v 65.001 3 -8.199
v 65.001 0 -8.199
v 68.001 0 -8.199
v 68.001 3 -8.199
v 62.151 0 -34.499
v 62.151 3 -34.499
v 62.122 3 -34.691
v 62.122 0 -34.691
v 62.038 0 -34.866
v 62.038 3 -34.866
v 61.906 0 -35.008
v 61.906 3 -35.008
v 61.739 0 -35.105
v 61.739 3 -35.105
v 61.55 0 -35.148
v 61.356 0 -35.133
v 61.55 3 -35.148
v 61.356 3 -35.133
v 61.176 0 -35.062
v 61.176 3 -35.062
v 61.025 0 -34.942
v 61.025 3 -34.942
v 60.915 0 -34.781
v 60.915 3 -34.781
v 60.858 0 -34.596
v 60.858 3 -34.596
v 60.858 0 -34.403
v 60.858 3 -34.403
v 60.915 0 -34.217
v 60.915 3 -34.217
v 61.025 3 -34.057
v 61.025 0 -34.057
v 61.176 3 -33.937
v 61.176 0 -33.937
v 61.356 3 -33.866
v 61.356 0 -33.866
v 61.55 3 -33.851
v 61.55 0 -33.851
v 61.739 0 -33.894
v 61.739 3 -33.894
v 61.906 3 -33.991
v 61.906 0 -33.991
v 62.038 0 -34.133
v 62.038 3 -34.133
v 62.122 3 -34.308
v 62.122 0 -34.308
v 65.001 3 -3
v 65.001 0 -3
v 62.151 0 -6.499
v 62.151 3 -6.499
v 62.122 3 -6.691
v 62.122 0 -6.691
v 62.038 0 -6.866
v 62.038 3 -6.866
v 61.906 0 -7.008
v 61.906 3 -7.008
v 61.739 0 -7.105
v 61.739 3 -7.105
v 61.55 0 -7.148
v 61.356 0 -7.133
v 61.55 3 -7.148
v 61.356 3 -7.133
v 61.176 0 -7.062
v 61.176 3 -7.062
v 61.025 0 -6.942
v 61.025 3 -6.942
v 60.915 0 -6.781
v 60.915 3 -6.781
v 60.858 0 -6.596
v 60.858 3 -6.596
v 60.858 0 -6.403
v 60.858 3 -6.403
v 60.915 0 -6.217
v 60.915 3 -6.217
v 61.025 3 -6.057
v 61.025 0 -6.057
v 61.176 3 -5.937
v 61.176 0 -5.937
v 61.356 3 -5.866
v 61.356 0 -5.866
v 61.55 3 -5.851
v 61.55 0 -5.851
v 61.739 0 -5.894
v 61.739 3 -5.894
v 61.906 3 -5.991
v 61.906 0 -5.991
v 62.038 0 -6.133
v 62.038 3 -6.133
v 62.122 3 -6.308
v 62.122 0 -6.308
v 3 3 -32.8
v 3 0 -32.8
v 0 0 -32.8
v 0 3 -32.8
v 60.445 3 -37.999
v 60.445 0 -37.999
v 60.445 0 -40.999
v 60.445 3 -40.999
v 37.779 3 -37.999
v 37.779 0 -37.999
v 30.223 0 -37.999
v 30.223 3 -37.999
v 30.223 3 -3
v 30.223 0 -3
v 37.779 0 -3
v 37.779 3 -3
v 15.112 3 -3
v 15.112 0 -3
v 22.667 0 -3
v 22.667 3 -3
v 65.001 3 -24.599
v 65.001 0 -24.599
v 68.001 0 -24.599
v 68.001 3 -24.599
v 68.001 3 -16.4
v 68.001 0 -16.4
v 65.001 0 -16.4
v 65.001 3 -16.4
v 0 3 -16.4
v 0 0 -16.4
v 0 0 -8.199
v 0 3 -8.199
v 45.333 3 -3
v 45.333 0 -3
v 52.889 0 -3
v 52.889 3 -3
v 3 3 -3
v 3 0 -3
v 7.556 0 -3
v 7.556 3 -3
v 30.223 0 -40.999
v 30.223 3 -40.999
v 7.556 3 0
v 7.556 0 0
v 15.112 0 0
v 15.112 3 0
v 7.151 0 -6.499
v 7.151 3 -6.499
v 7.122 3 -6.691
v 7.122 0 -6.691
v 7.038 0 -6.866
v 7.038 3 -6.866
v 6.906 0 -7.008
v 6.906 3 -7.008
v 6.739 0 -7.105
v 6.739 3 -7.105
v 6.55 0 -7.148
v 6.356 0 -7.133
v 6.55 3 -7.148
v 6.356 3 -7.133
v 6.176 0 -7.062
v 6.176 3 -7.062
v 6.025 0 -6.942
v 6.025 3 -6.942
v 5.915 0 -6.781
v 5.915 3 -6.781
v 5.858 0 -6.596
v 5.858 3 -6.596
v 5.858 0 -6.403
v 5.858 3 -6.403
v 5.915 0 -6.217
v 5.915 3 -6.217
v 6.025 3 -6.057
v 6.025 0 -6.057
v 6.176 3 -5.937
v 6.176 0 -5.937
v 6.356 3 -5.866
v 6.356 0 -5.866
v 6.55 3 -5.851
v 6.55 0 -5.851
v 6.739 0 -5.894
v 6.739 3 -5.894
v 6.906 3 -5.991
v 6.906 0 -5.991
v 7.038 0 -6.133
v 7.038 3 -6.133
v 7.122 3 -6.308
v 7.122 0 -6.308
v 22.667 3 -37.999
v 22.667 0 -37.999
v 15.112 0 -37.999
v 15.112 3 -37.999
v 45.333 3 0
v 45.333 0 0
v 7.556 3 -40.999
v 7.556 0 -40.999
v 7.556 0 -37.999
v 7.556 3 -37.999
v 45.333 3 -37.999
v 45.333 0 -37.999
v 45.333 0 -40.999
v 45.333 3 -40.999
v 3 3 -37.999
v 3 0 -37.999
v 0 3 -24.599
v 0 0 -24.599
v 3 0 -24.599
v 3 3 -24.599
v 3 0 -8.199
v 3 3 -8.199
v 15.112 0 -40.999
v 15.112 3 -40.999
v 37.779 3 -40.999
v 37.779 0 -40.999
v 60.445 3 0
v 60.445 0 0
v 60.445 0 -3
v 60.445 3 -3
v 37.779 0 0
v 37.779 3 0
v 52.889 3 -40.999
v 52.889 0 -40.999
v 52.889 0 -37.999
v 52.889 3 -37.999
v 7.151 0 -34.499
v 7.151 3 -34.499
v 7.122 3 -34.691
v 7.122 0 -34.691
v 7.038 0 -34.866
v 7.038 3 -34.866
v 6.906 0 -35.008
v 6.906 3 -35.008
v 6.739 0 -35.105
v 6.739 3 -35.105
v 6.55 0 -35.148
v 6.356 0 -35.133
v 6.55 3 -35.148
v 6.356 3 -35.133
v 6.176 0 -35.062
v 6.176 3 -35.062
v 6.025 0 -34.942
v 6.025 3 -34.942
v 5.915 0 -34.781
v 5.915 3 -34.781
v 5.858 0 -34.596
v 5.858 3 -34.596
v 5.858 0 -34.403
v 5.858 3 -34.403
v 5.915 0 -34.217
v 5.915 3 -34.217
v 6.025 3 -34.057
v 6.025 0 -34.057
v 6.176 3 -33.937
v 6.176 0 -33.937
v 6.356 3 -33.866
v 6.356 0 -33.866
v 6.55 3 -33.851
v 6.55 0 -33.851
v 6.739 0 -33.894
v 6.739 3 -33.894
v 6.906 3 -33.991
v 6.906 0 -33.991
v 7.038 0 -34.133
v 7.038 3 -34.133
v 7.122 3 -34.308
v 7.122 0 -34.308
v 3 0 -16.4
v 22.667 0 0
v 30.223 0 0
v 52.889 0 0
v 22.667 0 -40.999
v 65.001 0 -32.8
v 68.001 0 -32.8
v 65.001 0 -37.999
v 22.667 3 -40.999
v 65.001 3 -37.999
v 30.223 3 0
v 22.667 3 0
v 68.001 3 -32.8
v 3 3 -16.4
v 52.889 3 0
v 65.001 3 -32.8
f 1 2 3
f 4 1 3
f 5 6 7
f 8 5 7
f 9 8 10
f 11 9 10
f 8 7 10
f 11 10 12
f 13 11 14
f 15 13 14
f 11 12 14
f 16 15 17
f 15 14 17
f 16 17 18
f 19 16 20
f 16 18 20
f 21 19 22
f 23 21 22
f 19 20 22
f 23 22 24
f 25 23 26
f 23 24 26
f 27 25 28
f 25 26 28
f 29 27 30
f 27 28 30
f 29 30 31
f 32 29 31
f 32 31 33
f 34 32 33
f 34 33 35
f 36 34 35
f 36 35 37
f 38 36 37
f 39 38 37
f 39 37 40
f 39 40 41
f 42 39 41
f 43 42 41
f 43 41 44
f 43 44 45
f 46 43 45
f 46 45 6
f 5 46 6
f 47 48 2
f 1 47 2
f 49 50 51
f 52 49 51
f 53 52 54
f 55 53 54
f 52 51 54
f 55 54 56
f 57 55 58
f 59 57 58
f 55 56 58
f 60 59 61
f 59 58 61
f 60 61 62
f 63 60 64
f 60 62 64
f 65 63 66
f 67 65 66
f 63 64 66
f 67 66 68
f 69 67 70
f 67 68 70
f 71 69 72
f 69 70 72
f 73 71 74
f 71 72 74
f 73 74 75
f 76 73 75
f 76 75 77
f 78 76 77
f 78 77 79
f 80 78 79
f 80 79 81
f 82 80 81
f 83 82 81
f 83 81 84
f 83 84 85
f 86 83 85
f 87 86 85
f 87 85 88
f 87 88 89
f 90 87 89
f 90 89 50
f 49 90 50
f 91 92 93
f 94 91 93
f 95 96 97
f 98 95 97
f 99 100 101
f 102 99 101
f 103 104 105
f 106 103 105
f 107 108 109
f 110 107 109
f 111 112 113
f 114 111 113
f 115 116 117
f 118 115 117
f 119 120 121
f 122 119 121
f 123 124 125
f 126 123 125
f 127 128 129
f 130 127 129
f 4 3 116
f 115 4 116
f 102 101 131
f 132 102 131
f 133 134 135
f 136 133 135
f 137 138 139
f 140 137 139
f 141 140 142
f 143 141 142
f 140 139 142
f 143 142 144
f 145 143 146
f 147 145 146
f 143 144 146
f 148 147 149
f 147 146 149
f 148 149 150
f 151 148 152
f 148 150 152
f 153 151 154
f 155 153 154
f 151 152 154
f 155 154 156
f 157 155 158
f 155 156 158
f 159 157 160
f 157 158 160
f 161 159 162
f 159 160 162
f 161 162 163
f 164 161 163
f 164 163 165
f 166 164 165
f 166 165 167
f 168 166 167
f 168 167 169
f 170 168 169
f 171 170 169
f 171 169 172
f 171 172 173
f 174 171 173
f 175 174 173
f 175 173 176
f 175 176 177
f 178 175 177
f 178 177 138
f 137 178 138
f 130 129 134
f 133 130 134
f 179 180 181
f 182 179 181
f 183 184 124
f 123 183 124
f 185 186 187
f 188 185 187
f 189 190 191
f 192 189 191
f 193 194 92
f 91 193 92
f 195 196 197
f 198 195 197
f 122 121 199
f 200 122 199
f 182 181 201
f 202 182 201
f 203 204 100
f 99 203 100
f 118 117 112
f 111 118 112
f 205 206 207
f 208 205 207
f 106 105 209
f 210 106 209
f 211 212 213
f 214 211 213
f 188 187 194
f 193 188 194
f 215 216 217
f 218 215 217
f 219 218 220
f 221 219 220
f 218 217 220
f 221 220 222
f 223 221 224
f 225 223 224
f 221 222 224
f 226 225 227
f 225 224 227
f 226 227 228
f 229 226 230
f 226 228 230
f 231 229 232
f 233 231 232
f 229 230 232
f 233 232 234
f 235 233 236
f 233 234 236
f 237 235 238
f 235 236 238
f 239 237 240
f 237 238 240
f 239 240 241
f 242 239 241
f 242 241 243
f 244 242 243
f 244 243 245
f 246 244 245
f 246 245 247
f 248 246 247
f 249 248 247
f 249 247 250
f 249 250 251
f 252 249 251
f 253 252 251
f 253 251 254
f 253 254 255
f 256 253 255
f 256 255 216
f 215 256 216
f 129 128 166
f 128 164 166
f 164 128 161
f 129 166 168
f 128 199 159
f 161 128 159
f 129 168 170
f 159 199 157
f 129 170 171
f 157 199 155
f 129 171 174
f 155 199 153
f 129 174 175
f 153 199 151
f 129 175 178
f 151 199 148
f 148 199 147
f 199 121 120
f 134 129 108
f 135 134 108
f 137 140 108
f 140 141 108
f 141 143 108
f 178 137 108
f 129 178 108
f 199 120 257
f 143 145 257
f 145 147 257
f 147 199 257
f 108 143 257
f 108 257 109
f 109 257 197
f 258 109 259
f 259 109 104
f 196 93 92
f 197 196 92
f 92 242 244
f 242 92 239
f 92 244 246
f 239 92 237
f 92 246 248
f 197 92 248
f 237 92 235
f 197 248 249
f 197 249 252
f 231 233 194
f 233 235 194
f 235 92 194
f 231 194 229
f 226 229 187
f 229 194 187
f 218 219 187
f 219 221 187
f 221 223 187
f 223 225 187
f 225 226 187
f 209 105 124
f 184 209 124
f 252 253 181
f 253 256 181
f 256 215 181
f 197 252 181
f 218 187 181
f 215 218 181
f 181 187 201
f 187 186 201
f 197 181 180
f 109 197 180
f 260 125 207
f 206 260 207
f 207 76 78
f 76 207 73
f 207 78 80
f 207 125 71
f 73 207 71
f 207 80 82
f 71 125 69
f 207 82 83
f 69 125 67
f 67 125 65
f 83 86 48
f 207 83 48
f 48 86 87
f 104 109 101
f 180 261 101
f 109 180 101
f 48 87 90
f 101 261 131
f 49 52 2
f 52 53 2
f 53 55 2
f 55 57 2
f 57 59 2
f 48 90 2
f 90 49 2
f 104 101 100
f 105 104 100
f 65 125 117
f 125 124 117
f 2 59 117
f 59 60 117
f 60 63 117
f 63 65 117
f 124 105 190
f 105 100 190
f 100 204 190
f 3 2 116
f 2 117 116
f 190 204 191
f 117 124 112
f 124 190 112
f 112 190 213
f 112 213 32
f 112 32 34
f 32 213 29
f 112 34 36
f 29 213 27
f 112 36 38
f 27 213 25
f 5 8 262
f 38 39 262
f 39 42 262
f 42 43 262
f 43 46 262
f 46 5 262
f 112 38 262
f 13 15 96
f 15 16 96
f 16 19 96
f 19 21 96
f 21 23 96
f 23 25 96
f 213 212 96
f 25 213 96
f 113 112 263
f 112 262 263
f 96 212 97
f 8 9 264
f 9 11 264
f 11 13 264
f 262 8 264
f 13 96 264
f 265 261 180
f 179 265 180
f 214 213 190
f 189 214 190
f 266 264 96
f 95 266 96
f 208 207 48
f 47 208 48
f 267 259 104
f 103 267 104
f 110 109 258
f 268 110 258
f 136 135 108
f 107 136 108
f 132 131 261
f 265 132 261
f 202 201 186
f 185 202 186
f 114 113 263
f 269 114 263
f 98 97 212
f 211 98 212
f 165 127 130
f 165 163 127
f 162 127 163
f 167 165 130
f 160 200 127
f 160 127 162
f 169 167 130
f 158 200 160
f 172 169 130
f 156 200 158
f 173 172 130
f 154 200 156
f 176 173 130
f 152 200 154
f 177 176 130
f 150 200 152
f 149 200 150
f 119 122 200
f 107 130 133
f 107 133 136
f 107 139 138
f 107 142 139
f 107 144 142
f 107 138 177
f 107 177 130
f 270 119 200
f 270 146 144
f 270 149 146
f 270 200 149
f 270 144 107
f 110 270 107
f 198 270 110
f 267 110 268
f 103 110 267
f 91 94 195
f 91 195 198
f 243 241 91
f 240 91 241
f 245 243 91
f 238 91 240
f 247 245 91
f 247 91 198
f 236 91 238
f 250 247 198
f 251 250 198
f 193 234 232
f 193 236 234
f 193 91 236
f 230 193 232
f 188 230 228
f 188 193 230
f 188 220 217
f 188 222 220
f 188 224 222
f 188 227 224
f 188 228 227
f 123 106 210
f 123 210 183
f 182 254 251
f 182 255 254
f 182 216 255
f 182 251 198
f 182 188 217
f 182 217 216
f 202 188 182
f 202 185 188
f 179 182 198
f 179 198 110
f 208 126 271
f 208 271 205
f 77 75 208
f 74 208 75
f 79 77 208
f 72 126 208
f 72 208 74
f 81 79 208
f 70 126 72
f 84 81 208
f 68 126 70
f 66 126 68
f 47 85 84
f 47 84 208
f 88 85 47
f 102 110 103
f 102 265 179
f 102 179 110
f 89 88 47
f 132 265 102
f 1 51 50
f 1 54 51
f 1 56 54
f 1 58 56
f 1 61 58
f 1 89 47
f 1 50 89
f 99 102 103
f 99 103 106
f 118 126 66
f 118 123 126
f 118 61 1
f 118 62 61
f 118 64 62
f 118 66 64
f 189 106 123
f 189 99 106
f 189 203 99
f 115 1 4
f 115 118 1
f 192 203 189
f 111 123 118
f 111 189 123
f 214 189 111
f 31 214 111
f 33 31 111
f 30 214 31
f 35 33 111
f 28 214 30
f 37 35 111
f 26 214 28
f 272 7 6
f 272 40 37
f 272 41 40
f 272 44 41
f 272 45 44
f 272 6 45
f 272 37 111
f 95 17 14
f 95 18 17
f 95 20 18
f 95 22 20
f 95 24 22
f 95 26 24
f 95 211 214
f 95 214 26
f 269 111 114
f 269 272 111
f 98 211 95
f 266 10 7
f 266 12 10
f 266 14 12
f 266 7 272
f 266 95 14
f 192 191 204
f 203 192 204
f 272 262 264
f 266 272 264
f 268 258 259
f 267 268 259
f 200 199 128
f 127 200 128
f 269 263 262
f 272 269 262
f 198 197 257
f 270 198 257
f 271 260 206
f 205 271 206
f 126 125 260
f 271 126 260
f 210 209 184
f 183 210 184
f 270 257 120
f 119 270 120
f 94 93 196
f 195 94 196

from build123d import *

# Parameters (mm, degrees)
AUFSATZ_LINEAR_AUSTRAGEN1_DEPTH = 3
SCHNITT_LINEAR_AUSTRAGEN1_REACH = 5
SKIZZE2_R                       = 0.65


with BuildPart() as part:
    # Skizze1 → Aufsatz-Linear austragen1 (new body)
    with BuildSketch(Plane(origin=(0, 0, 0), x_dir=(1, 0, 0), z_dir=(0, 1, 0))):
        Polygon((2.999994, 37.999416), (2.999994, 32.800036), (0, 32.800036), (0, 24.599138), (2.999994, 24.599138), (2.999994, 16.399764), (0, 16.399764), (0, 8.19912), (2.999994, 8.19912), (2.999994, 2.999994), (7.555738, 2.999994), (7.555738, 0), (15.11173, 0), (15.11173, 2.999994), (22.667468, 2.999994), (22.667468, 0), (30.223206, 0), (30.223206, 2.999994), (37.778944, 2.999994), (37.778944, 0), (45.333412, 0), (45.333412, 2.999994), (52.88915, 2.999994), (52.88915, 0), (60.444888, 0), (60.444888, 2.999994), (65.000632, 2.999994), (65.000632, 8.19912), (68.00088, 8.19912), (68.00088, 16.399764), (65.000632, 16.399764), (65.000632, 24.599138), (68.00088, 24.599138), (68.00088, 32.800036), (65.000632, 32.800036), (65.000632, 37.999416), (60.444888, 37.999416), (60.444888, 40.99941), (52.88915, 40.99941), (52.88915, 37.999416), (45.333412, 37.999416), (45.333412, 40.99941), (37.778944, 40.99941), (37.778944, 37.999416), (30.223206, 37.999416), (30.223206, 40.99941), (22.667468, 40.99941), (22.667468, 37.999416), (15.11173, 37.999416), (15.11173, 40.99941), (7.555738, 40.99941), (7.555738, 37.999416), align=None)
    extrude(amount=AUFSATZ_LINEAR_AUSTRAGEN1_DEPTH)

    # Skizze2 → Schnitt-Linear austragen1 (cut, up to next)
    with BuildSketch(Plane(origin=(0, 3, 0), x_dir=(1, 0, 0), z_dir=(0, 1, 0)), mode=Mode.PRIVATE) as schnitt_linear_austragen1_sk1:
        with Locations((6.501075, 34.499451)):
            Circle(SKIZZE2_R)
    schnitt_linear_austragen1_tool1 = extrude(schnitt_linear_austragen1_sk1.sketch, amount=-SCHNITT_LINEAR_AUSTRAGEN1_REACH, mode=Mode.PRIVATE) & part.part
    add(schnitt_linear_austragen1_tool1.solids().sort_by_distance((6.501075, 3, -34.499451))[0], mode=Mode.SUBTRACT)
    # Skizze2 → Schnitt-Linear austragen1 (cut, up to next)
    with BuildSketch(Plane(origin=(0, 3, 0), x_dir=(1, 0, 0), z_dir=(0, 1, 0)), mode=Mode.PRIVATE) as schnitt_linear_austragen1_sk2:
        with Locations((61.501075, 34.499451)):
            Circle(SKIZZE2_R)
    schnitt_linear_austragen1_tool2 = extrude(schnitt_linear_austragen1_sk2.sketch, amount=-SCHNITT_LINEAR_AUSTRAGEN1_REACH, mode=Mode.PRIVATE) & part.part
    add(schnitt_linear_austragen1_tool2.solids().sort_by_distance((61.501075, 3, -34.499451))[0], mode=Mode.SUBTRACT)
    # Skizze2 → Schnitt-Linear austragen1 (cut, up to next)
    with BuildSketch(Plane(origin=(0, 3, 0), x_dir=(1, 0, 0), z_dir=(0, 1, 0)), mode=Mode.PRIVATE) as schnitt_linear_austragen1_sk3:
        with Locations((61.501075, 6.499451)):
            Circle(SKIZZE2_R)
    schnitt_linear_austragen1_tool3 = extrude(schnitt_linear_austragen1_sk3.sketch, amount=-SCHNITT_LINEAR_AUSTRAGEN1_REACH, mode=Mode.PRIVATE) & part.part
    add(schnitt_linear_austragen1_tool3.solids().sort_by_distance((61.501075, 3, -6.499451))[0], mode=Mode.SUBTRACT)
    # Skizze2 → Schnitt-Linear austragen1 (cut, up to next)
    with BuildSketch(Plane(origin=(0, 3, 0), x_dir=(1, 0, 0), z_dir=(0, 1, 0)), mode=Mode.PRIVATE) as schnitt_linear_austragen1_sk4:
        with Locations((6.501075, 6.499451)):
            Circle(SKIZZE2_R)
    schnitt_linear_austragen1_tool4 = extrude(schnitt_linear_austragen1_sk4.sketch, amount=-SCHNITT_LINEAR_AUSTRAGEN1_REACH, mode=Mode.PRIVATE) & part.part
    add(schnitt_linear_austragen1_tool4.solids().sort_by_distance((6.501075, 3, -6.499451))[0], mode=Mode.SUBTRACT)


solid = part.part
